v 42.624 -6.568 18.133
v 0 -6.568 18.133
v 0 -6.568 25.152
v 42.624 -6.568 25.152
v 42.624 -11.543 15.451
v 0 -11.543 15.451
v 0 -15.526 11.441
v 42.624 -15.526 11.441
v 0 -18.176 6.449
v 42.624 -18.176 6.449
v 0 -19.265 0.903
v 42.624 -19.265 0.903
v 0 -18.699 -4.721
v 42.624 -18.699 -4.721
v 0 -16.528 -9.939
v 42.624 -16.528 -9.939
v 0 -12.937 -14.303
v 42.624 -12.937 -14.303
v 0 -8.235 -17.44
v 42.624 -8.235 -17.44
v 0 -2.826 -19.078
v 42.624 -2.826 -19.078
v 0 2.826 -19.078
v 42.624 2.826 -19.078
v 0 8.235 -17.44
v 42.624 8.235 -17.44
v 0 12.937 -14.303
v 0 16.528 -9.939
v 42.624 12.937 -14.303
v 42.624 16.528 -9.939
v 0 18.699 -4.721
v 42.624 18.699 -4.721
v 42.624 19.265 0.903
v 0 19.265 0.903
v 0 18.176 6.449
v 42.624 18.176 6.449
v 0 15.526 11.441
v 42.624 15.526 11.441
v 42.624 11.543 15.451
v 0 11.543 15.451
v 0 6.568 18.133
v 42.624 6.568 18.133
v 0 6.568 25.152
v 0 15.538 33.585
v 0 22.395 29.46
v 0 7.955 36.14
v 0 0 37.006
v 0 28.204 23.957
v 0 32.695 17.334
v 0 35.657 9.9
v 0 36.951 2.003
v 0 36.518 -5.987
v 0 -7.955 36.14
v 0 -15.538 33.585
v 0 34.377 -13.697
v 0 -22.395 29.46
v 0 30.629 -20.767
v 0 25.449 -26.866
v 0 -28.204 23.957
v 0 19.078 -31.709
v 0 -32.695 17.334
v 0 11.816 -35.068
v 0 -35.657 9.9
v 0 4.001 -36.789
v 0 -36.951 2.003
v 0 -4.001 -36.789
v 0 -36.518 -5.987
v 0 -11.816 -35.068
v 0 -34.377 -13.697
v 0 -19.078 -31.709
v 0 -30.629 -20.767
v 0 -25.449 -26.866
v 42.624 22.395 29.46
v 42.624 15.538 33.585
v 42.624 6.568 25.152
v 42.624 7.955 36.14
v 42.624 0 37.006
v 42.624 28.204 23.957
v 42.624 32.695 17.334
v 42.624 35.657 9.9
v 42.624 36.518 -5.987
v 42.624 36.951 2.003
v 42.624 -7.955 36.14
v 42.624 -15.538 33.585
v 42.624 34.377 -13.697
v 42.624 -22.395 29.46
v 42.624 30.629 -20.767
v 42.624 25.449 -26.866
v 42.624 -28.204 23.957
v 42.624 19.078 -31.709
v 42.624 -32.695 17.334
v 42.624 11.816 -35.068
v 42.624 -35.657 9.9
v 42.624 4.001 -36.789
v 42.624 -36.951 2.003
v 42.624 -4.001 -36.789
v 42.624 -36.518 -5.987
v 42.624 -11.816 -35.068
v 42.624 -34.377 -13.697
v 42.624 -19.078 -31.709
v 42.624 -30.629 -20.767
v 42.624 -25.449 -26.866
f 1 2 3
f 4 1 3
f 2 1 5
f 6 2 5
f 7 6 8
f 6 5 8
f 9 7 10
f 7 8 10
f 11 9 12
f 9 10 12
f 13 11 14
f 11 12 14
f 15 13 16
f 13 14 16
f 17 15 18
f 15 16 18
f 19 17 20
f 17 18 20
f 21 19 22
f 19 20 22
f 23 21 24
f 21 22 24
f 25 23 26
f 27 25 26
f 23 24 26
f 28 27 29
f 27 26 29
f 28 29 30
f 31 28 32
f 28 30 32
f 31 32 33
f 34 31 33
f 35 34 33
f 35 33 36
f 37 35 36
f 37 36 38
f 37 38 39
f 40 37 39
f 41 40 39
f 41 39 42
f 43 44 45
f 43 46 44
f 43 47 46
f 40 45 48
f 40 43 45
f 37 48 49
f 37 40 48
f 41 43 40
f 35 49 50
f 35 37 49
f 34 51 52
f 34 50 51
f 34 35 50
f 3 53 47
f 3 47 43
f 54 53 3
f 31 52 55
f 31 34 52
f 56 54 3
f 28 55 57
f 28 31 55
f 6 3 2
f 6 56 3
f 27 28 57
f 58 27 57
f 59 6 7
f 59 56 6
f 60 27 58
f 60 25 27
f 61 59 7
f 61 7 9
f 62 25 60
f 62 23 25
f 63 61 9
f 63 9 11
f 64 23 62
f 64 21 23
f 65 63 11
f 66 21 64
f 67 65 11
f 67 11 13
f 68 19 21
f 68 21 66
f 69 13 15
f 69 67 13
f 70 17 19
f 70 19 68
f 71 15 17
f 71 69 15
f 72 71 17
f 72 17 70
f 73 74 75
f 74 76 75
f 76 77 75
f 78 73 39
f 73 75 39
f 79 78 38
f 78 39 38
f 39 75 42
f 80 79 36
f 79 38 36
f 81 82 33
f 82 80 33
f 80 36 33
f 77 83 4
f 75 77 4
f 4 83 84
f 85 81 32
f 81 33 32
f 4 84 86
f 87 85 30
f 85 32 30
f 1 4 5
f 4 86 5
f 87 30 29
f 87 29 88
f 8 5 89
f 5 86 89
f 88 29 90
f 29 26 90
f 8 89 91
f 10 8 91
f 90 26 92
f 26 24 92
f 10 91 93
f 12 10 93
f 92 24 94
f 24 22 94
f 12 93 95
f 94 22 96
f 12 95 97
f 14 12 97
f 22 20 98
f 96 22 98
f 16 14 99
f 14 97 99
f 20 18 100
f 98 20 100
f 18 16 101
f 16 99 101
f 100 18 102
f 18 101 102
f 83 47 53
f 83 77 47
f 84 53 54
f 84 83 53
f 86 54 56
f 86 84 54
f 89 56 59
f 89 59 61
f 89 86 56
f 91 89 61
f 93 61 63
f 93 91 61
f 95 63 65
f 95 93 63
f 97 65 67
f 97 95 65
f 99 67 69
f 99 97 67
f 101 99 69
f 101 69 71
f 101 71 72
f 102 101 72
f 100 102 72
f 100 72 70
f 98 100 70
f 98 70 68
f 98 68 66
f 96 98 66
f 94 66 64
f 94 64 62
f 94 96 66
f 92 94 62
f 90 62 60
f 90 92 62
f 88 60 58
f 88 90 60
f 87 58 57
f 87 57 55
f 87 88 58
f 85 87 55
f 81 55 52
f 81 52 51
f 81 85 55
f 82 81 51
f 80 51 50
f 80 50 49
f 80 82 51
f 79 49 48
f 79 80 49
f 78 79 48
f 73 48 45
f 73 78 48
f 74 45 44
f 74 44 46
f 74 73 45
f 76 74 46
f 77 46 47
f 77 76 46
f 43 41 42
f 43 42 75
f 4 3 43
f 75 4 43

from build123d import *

# Parameters (mm, degrees)
F0_W     = 42.6243245602
F0_H     = 17.7194328527
F2_W     = 13.1365954876
F2_H     = 19.5219665766
F3_DEPTH = 78.1549476087


with BuildPart() as f1:
    # F0 (on Front) → F1 (revolve)
    with BuildSketch(Plane.XZ):
        with Locations((21.3121622801, 28.1459019294)):
            Rectangle(F0_W, F0_H)
    revolve(axis=Axis((9.0612024069, 0, 0), (1, 0, 0)))

    # F2 (on Right) → F3 (cut)
    with BuildSketch(Plane.YZ):
        with Locations((0, 15.3909772635)):
            Rectangle(F2_W, F2_H)
    extrude(amount=F3_DEPTH, mode=Mode.SUBTRACT)


solid = f1.part
